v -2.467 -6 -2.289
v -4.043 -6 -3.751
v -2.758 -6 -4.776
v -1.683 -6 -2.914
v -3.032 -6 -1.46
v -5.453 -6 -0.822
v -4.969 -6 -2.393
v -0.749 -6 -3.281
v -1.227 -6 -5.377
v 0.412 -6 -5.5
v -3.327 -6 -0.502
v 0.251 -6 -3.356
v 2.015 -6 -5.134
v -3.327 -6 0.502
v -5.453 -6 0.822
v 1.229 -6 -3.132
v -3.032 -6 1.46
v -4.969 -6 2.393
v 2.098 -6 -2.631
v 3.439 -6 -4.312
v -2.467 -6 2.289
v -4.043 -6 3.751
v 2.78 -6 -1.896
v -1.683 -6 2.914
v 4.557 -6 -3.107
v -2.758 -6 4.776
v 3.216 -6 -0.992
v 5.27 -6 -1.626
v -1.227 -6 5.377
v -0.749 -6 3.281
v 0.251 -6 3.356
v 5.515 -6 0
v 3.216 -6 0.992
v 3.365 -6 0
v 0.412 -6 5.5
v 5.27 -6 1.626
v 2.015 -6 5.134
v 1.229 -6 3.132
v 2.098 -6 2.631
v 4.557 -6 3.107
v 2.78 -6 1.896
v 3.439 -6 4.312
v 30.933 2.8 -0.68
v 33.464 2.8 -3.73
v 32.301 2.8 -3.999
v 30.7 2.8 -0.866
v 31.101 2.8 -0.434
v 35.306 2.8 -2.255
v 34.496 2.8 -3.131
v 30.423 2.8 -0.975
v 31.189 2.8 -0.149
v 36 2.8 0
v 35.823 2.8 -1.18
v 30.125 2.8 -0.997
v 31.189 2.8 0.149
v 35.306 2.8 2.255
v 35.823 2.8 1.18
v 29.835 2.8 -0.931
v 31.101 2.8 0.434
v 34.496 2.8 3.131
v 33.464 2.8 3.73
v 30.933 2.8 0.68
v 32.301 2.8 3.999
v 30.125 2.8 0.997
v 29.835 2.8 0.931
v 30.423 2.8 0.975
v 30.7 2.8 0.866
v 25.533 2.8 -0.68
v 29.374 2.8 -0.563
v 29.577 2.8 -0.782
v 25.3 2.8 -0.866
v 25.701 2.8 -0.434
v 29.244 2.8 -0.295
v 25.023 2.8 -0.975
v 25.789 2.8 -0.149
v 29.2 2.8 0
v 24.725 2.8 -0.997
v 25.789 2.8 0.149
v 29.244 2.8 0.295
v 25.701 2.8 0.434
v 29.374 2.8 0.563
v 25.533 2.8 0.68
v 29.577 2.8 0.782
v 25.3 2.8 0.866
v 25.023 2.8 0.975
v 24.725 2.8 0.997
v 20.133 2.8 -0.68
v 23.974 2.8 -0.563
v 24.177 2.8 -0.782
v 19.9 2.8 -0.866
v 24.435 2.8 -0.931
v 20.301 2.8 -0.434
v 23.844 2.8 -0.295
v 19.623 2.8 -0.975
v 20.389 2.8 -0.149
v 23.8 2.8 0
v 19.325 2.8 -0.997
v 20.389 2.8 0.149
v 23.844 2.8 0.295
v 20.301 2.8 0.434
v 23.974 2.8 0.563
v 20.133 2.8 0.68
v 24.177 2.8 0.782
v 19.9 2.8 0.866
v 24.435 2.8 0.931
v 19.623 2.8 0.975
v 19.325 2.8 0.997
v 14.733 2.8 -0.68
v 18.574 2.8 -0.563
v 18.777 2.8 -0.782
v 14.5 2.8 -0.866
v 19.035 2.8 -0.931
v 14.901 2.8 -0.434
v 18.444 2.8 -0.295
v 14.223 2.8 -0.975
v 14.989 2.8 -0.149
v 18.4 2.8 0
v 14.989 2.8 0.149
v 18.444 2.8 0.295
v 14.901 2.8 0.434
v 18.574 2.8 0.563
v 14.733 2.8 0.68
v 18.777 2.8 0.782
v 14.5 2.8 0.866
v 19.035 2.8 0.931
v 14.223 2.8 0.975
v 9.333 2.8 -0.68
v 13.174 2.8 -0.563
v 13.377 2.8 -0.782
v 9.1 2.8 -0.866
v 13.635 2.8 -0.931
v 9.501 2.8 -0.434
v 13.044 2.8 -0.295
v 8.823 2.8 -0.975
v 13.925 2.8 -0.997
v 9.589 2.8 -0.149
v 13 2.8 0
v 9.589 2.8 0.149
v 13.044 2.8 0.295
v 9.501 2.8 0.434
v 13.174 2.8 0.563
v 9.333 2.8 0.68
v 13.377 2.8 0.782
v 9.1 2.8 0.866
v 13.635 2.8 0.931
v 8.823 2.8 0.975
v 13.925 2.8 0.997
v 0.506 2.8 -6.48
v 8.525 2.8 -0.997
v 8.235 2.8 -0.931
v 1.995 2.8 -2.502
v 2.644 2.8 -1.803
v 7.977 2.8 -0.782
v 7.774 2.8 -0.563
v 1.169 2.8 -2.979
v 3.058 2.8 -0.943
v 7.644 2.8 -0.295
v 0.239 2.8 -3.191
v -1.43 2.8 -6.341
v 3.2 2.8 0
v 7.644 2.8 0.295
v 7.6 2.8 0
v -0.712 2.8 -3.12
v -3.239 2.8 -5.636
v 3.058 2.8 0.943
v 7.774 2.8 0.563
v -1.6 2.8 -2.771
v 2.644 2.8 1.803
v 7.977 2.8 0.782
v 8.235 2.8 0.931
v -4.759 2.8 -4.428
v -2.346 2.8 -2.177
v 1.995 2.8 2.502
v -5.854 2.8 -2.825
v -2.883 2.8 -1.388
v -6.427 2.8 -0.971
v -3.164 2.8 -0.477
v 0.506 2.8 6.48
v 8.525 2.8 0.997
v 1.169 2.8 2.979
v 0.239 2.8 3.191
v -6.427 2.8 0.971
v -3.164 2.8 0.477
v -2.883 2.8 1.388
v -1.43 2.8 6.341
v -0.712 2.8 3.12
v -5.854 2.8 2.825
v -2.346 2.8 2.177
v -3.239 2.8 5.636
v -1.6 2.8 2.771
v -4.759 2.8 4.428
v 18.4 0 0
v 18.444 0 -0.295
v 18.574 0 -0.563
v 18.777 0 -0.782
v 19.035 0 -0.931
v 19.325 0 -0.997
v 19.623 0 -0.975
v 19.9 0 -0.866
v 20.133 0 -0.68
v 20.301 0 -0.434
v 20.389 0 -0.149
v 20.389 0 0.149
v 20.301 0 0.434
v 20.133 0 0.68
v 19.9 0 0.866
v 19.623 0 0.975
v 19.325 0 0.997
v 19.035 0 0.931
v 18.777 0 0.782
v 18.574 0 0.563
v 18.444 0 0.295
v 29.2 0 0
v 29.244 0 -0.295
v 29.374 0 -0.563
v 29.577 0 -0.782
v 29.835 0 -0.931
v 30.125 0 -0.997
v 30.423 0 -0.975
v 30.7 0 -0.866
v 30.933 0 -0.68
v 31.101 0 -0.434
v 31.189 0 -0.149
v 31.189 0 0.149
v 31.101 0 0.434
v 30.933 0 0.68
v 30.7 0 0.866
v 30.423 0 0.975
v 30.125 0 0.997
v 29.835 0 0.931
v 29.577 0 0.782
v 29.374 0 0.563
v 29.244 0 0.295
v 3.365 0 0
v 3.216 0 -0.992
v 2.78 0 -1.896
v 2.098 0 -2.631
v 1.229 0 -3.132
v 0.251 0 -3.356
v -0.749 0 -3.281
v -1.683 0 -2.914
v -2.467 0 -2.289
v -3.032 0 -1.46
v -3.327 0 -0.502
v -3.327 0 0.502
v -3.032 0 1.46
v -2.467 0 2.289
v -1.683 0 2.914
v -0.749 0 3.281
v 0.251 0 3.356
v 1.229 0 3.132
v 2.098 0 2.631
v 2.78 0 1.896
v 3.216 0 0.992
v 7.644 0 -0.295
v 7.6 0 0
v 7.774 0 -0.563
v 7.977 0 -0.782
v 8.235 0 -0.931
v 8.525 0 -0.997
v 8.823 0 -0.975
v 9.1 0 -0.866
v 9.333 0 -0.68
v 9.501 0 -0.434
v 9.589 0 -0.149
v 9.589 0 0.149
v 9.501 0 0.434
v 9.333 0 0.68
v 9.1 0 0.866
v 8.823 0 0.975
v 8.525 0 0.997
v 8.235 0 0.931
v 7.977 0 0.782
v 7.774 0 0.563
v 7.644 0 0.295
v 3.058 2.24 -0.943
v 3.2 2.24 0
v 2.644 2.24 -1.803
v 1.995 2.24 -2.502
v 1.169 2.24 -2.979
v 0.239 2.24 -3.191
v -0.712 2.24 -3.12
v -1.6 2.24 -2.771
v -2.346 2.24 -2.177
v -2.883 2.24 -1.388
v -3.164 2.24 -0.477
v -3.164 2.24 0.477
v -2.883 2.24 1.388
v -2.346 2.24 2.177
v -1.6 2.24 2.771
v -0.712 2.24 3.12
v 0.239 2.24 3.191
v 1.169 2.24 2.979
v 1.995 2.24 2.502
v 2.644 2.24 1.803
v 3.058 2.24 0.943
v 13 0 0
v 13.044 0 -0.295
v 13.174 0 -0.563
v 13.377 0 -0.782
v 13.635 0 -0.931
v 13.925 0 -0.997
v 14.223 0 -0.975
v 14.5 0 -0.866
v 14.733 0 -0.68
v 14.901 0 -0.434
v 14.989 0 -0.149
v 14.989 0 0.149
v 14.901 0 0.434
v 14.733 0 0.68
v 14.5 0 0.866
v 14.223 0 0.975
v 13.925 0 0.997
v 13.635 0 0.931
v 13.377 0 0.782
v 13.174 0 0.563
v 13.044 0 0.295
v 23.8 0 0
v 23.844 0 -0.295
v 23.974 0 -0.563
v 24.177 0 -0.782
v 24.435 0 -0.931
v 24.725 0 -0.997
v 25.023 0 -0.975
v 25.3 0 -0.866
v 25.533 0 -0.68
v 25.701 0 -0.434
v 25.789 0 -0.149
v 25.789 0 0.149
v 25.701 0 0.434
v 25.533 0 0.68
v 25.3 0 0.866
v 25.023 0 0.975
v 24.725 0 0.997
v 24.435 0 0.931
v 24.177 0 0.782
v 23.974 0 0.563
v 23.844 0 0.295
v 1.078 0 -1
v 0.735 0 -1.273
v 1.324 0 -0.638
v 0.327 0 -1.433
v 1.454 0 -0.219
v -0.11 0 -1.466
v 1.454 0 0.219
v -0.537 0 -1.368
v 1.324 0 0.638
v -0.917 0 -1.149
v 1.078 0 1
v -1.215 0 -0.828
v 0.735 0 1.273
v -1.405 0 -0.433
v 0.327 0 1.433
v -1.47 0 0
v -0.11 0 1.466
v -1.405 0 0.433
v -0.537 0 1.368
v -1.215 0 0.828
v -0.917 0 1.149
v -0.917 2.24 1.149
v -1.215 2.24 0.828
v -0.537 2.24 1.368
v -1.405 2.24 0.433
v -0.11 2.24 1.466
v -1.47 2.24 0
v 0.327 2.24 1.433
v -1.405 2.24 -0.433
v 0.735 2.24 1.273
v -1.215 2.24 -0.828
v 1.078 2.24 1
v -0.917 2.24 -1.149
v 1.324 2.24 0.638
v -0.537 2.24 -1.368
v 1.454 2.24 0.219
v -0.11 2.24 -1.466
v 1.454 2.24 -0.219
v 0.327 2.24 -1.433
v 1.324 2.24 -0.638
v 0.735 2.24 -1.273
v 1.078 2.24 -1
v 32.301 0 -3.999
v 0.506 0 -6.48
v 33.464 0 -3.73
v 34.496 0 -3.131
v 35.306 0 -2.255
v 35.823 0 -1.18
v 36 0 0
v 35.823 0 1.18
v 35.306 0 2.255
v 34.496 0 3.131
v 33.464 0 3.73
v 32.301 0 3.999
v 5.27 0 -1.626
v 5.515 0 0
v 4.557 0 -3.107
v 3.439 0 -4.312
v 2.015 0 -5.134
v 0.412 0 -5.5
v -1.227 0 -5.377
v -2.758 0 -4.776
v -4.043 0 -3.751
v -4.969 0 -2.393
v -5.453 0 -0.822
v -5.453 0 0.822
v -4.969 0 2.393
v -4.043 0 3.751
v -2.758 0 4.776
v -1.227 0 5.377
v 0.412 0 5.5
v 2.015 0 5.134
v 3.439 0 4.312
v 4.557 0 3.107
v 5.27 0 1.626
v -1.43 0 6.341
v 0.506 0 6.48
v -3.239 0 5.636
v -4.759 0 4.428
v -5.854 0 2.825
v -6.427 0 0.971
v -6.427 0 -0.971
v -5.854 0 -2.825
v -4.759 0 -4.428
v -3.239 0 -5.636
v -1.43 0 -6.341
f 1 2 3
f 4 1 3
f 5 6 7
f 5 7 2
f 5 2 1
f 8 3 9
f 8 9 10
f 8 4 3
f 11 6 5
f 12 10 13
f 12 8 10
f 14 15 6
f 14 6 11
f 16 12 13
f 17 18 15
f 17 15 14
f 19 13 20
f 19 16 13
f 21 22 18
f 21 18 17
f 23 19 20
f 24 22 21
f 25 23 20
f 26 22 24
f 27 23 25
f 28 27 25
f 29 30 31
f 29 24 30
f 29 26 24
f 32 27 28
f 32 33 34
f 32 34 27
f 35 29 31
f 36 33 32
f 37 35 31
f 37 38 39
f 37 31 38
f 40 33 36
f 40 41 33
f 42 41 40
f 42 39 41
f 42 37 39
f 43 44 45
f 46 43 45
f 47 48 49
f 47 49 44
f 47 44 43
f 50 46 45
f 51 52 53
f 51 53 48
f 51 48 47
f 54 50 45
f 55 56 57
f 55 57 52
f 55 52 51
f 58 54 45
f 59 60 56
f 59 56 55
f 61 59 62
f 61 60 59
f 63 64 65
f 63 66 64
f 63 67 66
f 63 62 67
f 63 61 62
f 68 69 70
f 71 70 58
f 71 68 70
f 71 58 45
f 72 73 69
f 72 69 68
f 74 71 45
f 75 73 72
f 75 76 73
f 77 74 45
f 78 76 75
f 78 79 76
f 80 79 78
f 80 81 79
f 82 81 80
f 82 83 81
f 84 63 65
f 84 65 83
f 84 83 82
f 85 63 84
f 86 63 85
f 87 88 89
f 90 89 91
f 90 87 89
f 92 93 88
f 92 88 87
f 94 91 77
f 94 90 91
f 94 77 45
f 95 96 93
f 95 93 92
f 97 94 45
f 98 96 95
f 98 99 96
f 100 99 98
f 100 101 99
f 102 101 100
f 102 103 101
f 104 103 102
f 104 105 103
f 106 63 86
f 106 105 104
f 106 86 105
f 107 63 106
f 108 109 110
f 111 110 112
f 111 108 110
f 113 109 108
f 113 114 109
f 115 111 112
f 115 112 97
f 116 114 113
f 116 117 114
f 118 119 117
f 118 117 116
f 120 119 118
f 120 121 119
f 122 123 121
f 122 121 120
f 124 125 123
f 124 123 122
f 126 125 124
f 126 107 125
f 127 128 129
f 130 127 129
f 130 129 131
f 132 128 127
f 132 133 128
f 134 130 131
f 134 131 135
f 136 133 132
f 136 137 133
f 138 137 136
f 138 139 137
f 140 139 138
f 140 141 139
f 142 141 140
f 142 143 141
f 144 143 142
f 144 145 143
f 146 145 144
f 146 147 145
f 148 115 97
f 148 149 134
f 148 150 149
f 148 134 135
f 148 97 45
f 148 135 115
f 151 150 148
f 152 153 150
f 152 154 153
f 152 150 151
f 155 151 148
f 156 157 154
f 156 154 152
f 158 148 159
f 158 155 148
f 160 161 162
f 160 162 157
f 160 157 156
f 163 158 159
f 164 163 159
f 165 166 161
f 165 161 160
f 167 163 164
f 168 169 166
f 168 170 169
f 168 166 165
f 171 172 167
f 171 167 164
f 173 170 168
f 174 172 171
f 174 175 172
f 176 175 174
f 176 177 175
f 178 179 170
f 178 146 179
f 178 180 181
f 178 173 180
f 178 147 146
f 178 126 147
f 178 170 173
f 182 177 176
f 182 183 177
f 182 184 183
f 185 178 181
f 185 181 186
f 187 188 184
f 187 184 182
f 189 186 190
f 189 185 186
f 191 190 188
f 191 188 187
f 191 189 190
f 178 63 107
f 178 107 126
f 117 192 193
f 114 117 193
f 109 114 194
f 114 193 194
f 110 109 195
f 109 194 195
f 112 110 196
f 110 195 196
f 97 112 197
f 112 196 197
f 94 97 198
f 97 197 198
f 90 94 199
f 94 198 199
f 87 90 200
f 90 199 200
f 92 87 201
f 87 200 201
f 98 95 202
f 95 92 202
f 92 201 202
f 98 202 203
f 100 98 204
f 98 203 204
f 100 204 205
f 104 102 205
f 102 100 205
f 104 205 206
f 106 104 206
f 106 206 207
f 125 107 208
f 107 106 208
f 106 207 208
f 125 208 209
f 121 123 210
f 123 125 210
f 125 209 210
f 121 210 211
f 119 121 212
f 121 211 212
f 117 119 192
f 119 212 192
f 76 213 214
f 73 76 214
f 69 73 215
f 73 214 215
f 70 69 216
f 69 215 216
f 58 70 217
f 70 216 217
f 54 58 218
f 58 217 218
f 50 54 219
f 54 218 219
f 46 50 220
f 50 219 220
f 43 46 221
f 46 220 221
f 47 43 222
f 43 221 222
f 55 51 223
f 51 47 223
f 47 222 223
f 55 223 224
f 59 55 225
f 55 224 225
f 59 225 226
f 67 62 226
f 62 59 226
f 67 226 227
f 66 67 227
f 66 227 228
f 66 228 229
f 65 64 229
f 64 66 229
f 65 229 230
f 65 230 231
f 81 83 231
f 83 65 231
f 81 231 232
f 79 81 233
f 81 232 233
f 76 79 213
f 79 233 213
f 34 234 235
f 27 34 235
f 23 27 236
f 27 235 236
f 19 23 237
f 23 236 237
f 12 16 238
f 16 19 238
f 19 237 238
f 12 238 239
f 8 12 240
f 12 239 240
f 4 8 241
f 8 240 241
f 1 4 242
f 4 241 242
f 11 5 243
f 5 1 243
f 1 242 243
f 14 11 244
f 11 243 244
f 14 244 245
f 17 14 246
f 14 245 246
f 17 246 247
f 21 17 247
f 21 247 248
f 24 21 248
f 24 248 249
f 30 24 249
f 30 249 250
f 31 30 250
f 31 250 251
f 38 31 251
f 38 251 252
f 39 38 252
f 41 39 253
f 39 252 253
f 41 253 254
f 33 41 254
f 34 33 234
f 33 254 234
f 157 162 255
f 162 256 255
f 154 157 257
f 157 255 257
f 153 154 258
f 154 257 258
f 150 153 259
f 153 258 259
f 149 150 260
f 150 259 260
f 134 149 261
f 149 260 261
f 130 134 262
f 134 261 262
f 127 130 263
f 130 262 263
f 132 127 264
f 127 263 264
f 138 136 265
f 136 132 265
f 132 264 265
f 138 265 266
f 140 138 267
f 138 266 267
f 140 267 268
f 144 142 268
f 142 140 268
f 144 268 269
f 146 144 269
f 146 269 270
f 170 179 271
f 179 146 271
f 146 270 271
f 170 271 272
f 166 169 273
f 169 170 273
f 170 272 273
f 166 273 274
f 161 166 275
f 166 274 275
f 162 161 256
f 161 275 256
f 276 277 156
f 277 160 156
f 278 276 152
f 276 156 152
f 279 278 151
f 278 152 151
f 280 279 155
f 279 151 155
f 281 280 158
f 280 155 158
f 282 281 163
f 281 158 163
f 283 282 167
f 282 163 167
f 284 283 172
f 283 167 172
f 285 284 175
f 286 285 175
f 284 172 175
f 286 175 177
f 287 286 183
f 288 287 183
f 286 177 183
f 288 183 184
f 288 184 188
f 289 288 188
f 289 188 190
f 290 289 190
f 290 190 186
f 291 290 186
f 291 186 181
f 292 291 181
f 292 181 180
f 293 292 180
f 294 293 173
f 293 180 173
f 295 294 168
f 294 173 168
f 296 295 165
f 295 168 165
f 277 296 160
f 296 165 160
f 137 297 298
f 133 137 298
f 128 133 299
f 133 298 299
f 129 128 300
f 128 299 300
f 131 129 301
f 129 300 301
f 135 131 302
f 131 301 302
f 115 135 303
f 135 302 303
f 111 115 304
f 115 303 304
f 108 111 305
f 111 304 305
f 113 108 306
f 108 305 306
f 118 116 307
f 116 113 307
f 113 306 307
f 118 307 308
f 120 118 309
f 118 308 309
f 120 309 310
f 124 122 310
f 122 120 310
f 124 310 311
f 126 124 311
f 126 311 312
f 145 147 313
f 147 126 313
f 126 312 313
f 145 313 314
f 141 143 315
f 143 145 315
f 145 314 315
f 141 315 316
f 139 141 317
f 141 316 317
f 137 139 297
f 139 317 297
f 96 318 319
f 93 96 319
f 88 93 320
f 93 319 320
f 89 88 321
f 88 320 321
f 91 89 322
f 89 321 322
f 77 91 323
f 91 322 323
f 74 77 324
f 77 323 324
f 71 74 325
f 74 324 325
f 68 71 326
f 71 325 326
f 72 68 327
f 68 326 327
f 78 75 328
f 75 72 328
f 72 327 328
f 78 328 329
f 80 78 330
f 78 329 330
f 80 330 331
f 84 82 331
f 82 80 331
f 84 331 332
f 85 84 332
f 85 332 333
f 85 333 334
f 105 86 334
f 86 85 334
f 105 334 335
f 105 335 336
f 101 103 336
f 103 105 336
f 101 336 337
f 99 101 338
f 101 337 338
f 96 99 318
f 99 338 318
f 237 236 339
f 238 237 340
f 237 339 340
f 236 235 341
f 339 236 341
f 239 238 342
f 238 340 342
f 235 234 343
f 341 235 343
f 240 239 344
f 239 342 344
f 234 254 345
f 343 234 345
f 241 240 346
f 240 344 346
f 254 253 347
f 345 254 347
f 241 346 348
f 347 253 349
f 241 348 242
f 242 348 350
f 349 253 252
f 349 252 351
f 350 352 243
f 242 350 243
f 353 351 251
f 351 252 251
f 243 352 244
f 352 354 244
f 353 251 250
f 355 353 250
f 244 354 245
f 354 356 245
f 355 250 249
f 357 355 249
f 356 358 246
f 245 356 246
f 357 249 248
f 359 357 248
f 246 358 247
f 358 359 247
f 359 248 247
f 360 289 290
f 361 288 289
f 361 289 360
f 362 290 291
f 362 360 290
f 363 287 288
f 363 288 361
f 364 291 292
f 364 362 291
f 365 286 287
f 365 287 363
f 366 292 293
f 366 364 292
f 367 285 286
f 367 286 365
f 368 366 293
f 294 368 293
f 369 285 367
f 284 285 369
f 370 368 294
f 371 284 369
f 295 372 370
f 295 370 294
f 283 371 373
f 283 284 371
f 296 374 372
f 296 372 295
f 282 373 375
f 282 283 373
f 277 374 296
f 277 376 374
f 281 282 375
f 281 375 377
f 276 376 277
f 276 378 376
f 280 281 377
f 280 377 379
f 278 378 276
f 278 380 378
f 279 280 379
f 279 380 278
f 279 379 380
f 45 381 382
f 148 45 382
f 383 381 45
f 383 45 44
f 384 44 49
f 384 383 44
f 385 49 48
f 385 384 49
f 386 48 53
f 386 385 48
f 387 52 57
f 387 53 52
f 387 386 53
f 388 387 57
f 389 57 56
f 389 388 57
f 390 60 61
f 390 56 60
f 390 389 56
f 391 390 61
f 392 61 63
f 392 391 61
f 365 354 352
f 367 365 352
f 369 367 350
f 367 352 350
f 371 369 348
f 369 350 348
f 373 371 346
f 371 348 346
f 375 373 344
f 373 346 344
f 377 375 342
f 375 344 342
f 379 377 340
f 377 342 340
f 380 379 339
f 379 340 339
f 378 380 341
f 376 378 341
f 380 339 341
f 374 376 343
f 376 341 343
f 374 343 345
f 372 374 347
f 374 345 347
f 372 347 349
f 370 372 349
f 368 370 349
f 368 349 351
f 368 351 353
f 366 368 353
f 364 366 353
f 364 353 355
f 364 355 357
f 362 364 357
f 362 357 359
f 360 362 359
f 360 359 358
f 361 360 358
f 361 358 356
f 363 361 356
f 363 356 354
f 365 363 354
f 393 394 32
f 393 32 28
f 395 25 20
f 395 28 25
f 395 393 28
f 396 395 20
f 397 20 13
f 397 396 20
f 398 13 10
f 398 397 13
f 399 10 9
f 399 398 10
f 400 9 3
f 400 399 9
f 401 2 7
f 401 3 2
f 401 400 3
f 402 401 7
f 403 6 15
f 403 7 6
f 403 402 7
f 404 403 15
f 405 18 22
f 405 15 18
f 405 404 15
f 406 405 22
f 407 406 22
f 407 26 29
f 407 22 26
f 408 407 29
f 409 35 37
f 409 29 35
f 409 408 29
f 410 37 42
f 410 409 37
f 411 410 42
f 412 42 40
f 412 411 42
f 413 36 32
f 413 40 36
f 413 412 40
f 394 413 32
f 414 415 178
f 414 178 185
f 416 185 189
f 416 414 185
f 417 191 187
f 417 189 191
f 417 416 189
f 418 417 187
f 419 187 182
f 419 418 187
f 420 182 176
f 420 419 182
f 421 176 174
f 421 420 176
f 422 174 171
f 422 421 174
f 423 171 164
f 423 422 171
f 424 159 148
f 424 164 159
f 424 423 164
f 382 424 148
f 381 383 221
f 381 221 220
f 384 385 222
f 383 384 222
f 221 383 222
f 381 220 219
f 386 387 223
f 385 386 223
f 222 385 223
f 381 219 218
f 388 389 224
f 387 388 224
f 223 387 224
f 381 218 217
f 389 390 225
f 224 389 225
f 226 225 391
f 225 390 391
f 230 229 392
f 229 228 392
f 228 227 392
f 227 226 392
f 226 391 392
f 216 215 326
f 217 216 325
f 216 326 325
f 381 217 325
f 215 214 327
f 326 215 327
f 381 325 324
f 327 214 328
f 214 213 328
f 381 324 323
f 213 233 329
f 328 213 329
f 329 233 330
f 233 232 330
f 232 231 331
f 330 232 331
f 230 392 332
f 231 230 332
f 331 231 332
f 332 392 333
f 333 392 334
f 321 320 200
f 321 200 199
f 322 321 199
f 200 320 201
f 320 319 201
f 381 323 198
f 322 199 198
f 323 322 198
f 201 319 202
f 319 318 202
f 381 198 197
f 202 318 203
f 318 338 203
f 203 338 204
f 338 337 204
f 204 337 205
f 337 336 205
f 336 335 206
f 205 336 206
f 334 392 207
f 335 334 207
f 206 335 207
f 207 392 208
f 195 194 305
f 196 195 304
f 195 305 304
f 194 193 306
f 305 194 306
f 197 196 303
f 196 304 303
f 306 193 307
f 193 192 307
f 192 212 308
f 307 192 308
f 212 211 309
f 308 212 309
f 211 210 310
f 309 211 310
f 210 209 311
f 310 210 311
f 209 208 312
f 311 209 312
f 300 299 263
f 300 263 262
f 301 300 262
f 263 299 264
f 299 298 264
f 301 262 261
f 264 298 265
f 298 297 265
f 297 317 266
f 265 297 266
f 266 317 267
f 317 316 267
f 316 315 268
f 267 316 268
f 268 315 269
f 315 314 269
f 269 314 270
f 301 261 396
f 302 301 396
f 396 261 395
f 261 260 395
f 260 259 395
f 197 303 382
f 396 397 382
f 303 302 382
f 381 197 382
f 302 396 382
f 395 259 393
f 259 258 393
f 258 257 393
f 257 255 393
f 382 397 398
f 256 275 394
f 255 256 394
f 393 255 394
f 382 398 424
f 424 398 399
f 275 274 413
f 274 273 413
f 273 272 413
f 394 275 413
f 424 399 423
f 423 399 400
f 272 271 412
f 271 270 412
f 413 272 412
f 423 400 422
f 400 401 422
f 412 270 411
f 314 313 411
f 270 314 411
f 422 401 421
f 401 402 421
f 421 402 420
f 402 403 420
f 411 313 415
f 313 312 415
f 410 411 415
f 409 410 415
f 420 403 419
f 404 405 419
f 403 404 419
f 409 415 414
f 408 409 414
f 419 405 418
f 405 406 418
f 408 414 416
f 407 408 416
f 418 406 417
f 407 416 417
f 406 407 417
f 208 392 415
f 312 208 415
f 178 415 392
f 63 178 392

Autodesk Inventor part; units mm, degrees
ref_plane "YZ Plane" through (0, 0, 0) normal (1, 0, 0) x (0, 1, 0)
ref_plane "XZ Plane" through (0, 0, 0) normal (0, 1, 0) x (-1, 0, 0)
ref_plane "XY Plane" through (0, 0, 0) normal (0, 0, 1) x (1, 0, 0)
sketch "Sketch1" plane through (0, 0, 0) normal (0, 1, 0) x (-1, 0, 0)
  arc A0 (-0.5058, -6.4803) -> (-0.5058, 6.4803) centre (0, 0) ccw
  arc A1 (-32.3013, 3.9986) -> (-32.3013, -3.9986) centre (-31.9892, 0) ccw
  line L0 (-32.3013, -3.9986) -> (-0.5058, -6.4803)
  line L1 (-0.5058, 6.4803) -> (-32.3013, 3.9986)
  circle A2 centre (0, 0) radius 1.47
  circle A3 centre (-14, 0) radius 1
  circle A4 centre (-19.4, 0) radius 1
  circle A5 centre (-24.8, 0) radius 1
  circle A6 centre (-30.2, 0) radius 1
  circle A7 centre (-8.6, 0) radius 1
  point P0 (-36, 0)
  point P1 (-36, 0)
  dimension "d0" = 0
  dimension "d1" = 0
  dimension "d2" = 13
  dimension "d3" = 0
  dimension "d4" = 42.5
  dimension "d5" = 2.94
  dimension "d6" = 5.4
  dimension "d7" = 5.4
  dimension "d8" = 5.4
  dimension "d9" = 5.4
  dimension "d10" = 0
  dimension "d11" = 5.8
  dimension "d12" = 2
  dimension "d13" = 2
  dimension "d14" = 2
  dimension "d15" = 2
  dimension "d16" = 2
  dimension "d17" = 0
  dimension "d18" = 0
  dimension "d19" = 0
  dimension "d20" = 0
  dimension "d21" = 0
  dimension "d22" = 3.15
extrude "Extrusion1" add sketch "Sketch1" along normal blind 2.8
sketch "Sketch2" plane through (0, 0, 0) normal (0, -1, 0) x (1, 0, 0)
  circle A0 centre (0, 0) radius 3.365 construction
  arc A1 (0.5058, 6.4803) -> (0.5058, -6.4803) centre (0, 0) ccw projected
  circle A2 centre (0, 0) radius 5.515
  circle A3 centre (0, 0) radius 3.365
  dimension "d25" = 11.03
  dimension "d28" = 6.73
extrude "Extrusion3" add sketch "Sketch2" along normal blind 6
sketch "Sketch3" plane through (0, 2.8, 0) normal (0, 1, 0) x (1, 0, 0)
  circle A0 centre (0, 0) radius 1.47 projected
  arc A1 (0.5058, 6.4803) -> (0.5058, -6.4803) centre (0, 0) ccw projected
  circle A2 centre (0, 0) radius 3.2
  dimension "d31" = 6.4
extrude "Extrusion4" cut sketch "Sketch3" against normal blind 0.56
equation "\"d7\" = d6"
equation "\"d8\" = d6"
equation "\"d9\" = d6"
equation "\"d13\" = d12"
equation "\"d14\" = d12"
equation "\"d15\" = d12"
equation "\"d16\" = d12"
properties part number "ServoHorn"
